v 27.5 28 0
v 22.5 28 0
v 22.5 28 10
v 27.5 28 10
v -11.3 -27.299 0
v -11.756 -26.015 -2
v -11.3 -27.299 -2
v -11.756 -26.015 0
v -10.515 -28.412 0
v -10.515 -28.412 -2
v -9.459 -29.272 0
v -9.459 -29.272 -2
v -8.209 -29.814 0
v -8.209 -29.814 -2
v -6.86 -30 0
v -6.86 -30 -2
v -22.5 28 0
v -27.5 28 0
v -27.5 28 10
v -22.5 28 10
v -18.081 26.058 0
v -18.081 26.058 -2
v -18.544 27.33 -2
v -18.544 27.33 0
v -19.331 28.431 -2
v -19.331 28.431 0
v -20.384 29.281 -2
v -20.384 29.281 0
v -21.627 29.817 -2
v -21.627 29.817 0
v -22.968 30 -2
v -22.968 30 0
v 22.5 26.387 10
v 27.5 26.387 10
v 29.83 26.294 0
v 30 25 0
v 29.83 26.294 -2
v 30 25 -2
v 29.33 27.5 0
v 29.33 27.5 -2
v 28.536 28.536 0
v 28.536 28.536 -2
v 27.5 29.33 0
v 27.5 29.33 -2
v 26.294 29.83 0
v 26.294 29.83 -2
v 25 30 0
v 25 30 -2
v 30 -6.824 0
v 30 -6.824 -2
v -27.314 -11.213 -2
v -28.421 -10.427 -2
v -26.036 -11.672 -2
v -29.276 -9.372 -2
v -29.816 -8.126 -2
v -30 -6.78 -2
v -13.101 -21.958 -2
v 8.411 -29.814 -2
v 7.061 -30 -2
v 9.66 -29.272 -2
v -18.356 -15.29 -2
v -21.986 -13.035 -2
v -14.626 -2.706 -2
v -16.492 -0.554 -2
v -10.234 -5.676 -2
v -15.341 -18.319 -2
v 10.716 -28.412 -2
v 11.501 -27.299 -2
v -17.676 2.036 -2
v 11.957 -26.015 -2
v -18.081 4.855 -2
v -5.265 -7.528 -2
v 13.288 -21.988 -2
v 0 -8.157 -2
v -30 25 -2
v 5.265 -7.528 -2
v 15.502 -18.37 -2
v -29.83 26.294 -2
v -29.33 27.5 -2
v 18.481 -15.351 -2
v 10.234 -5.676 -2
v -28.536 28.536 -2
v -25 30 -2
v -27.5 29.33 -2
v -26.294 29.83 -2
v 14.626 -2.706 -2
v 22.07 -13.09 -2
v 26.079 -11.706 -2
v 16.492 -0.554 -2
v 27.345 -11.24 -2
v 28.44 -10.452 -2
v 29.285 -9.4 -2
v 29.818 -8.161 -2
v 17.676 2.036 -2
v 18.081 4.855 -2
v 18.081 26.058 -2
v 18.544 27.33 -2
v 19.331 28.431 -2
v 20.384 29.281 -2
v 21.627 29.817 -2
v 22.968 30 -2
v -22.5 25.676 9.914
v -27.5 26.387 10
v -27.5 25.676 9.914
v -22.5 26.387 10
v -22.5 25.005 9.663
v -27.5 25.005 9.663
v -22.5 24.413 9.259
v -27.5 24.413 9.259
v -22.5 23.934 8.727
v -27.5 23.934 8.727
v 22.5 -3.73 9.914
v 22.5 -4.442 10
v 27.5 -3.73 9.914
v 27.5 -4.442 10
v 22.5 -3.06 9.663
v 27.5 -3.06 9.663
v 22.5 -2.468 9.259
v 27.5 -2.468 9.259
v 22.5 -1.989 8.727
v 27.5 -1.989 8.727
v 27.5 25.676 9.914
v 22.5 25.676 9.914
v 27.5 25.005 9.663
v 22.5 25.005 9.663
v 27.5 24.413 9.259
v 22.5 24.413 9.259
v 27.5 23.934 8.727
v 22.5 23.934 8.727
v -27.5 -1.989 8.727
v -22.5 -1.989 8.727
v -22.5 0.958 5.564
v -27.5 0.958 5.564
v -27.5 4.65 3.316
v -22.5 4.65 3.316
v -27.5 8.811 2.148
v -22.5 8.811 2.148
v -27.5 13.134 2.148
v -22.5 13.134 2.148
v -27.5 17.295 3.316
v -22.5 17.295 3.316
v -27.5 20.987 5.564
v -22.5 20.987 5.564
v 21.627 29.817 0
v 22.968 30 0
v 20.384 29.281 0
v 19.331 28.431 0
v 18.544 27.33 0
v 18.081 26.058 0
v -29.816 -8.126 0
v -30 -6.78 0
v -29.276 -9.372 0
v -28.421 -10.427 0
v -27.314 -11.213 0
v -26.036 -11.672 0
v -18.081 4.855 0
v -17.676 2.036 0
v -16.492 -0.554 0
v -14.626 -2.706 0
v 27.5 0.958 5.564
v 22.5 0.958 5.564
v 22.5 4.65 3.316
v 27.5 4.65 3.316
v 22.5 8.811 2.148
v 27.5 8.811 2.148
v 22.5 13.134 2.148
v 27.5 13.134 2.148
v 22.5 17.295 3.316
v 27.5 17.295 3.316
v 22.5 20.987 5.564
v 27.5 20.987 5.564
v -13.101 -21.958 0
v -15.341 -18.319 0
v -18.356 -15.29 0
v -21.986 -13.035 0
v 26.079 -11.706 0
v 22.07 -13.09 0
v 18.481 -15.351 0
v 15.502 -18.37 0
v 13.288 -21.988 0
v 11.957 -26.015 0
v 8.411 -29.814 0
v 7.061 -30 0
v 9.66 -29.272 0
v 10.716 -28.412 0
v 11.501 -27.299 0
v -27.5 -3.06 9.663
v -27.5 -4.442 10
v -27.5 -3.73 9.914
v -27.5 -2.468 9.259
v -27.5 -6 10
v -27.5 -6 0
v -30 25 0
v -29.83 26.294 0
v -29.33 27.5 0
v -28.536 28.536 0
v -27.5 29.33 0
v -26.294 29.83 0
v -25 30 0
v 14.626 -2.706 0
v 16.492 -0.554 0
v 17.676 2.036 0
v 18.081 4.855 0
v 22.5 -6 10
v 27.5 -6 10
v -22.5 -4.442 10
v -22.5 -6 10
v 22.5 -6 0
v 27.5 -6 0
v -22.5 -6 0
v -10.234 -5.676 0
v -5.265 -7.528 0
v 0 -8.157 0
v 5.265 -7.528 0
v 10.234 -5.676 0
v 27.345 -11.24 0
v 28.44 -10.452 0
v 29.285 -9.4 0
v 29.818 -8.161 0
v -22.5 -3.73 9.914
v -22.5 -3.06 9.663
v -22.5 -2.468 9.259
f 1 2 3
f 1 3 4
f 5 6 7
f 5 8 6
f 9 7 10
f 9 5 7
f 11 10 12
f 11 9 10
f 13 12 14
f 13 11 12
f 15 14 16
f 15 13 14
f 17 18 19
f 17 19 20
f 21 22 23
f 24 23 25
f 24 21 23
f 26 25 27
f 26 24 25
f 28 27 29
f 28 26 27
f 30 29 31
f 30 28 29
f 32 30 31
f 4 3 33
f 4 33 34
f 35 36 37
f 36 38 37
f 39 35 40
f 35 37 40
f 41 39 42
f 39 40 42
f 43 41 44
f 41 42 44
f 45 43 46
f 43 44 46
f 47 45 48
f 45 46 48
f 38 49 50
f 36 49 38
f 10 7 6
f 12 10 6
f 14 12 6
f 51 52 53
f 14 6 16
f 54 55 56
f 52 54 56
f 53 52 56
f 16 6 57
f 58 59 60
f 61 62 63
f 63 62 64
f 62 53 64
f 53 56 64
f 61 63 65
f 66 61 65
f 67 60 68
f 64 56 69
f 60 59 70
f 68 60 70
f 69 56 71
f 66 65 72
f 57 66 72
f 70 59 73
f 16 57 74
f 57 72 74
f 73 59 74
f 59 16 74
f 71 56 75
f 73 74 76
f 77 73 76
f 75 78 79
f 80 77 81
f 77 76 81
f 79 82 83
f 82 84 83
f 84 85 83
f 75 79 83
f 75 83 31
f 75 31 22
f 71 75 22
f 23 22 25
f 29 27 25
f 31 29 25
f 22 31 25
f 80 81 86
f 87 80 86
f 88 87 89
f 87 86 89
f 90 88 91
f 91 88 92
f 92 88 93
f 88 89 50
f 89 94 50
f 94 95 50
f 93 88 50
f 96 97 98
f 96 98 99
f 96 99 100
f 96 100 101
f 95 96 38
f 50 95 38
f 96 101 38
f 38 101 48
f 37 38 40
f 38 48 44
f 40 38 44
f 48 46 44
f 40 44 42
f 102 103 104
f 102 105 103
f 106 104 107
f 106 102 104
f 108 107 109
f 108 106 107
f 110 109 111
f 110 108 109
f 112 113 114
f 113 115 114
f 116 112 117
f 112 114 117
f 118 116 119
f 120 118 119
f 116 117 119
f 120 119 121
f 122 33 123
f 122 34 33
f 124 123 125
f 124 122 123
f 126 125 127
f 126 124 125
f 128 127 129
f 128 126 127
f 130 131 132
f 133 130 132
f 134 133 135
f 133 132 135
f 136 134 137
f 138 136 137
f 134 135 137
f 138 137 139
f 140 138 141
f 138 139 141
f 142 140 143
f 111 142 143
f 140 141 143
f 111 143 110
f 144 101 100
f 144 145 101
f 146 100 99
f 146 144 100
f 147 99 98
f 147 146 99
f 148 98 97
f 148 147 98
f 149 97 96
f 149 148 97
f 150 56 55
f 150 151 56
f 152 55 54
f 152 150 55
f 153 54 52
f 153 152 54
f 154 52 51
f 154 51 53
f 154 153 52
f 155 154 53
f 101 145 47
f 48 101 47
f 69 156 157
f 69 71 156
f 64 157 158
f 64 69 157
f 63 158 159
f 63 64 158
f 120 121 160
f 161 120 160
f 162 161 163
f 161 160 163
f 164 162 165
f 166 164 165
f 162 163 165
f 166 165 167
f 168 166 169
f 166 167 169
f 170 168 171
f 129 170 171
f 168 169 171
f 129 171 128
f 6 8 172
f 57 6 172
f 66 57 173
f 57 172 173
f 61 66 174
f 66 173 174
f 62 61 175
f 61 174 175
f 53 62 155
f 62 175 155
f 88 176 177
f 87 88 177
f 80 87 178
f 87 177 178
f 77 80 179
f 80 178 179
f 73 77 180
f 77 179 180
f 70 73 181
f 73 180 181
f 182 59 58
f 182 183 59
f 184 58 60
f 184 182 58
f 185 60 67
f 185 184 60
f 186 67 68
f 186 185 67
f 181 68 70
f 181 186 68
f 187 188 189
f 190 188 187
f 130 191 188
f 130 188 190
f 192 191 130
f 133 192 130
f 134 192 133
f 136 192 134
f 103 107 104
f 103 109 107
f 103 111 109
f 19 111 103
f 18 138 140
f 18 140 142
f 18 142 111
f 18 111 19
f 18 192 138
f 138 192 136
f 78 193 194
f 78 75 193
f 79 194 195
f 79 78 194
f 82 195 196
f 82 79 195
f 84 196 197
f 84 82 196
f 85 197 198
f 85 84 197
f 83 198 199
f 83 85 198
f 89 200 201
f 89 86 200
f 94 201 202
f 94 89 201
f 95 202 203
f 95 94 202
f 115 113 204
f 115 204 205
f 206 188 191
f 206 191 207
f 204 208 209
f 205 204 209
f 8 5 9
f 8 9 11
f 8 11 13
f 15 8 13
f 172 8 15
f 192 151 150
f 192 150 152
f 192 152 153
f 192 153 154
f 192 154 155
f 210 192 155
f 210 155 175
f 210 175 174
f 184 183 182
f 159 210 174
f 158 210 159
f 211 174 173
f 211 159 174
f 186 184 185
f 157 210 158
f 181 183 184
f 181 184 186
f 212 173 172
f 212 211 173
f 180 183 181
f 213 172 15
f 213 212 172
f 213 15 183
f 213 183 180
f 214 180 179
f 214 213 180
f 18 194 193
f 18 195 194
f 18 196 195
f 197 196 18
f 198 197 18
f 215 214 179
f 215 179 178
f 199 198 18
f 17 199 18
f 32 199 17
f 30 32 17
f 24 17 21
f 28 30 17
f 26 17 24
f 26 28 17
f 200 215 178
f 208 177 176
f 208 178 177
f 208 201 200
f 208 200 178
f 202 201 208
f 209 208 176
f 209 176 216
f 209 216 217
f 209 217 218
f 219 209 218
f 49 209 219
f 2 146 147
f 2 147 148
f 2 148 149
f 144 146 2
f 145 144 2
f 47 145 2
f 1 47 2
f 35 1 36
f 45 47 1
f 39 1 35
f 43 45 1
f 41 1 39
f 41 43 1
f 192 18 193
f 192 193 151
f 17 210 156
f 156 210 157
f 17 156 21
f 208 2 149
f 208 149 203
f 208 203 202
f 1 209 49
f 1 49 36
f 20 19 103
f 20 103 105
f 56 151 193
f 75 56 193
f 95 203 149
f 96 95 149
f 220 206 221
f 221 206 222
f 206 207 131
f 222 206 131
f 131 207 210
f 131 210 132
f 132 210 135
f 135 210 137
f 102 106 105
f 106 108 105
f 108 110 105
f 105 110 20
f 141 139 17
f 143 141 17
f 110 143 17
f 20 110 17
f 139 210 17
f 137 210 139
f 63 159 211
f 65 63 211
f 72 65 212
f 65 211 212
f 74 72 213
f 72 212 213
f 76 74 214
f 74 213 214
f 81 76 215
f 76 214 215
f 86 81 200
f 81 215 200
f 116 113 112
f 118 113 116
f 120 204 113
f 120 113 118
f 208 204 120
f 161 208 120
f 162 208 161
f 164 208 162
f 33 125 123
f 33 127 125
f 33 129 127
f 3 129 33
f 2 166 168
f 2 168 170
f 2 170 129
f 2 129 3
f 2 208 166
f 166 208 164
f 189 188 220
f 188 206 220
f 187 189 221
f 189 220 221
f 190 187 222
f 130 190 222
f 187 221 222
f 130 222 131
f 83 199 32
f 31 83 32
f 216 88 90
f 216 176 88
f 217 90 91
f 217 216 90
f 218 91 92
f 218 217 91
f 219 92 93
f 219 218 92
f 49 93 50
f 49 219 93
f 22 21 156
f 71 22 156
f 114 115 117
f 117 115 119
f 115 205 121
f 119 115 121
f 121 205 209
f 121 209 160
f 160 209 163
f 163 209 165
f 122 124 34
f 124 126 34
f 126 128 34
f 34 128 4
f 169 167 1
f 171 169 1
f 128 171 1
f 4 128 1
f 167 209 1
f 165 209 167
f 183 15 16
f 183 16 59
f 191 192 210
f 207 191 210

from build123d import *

# Parameters (mm, degrees)
F0_W      = 60
F0_H      = 60
F1_DEPTH  = 2
F2_W      = 5
F2_H      = 34
F3_DEPTH  = 10
F4_R      = 15.85
F5_DEPTH  = 30
F6_R      = 18.5
F7_DEPTH  = 3.5
F8_R      = 5
F10_DEPTH = 4
F11_R     = 10
F12_R     = 3


# Not quite as in the source:
# - a feature names something its author has since deleted; it is built from what else it names


with BuildPart() as f1:
    # F0 (on Top) → F1 (new body)
    with BuildSketch(Plane.XY):
        Rectangle(F0_W, F0_H)
    extrude(amount=-F1_DEPTH)

    # F2 (on face) → F3 (join)
    with BuildSketch(Plane.XY):
        with Locations((-25, 11)):
            Rectangle(F2_W, F2_H)
        with Locations((25, 11)):
            Rectangle(F2_W, F2_H)
    extrude(amount=F3_DEPTH)

    # F4 (on Right) → F5 (cut, symmetric)
    with BuildSketch(Plane.YZ):
        with Locations((10.9725513698, 17.85)):
            Circle(F4_R)
    extrude(amount=F5_DEPTH, both=True, mode=Mode.SUBTRACT)

    # F6 (on Top) → F7 (cut)
    with BuildSketch(Plane.XY):
        with Locations((-29.8706907779, -29.7701153904)):
            Circle(F6_R)
        with Locations((0, 29.9712661654)):
            Circle(F6_R)
        with Locations((30.0718415529, -29.7701153904)):
            Circle(F6_R)
    extrude(amount=-F7_DEPTH, mode=Mode.SUBTRACT)

    # F8
    f8_edges = [f1.edges().sort_by_distance(p)[0] for p in [
        (-30, -11.270567, -1),
        (-11.372119, -30, -1),
        (11.57327, -30, -1),
        (30, -11.270255, -1),
        (30, 30, -1),
        (18.499978, 30, -1),
        (-18.499978, 30, -1),
        (-30, 30, -1),
    ]]
    fillet(f8_edges, radius=F8_R)

    # F9 (on face) → F10 (cut)
    with BuildSketch(Plane.XY):
        with BuildLine():
            Line((18.0813198277, 1.0577162054), (18.0813198277, 26.0577162054))
            ThreePointArc((18.0813198277, 26.0577162054), (0, 11.4712661654), (-18.0813198277, 26.0577162054))
            Line((-18.0813198277, 26.0577162054), (-18.0813198277, 1.0577162054))
            ThreePointArc((-18.0813198277, 1.0577162054), (0, -8.1568370453), (18.0813198277, 1.0577162054))
        make_face()
    extrude(amount=-F10_DEPTH, mode=Mode.SUBTRACT)

    # F11
    f11_edges = [f1.edges().sort_by_distance(p)[0] for p in [
        (-18.08132, 1.057716, -1),
        (18.08132, 1.057716, -1),
    ]]
    fillet(f11_edges, radius=F11_R)

    # F12
    f12_edges = [f1.edges().sort_by_distance(p)[0] for p in [
        (-25, 24.742083, 10),
        (-25, -2.79698, 10),
        (25, 24.742083, 10),
        (25, -2.79698, 10),
    ]]
    fillet(f12_edges, radius=F12_R)


solid = f1.part
